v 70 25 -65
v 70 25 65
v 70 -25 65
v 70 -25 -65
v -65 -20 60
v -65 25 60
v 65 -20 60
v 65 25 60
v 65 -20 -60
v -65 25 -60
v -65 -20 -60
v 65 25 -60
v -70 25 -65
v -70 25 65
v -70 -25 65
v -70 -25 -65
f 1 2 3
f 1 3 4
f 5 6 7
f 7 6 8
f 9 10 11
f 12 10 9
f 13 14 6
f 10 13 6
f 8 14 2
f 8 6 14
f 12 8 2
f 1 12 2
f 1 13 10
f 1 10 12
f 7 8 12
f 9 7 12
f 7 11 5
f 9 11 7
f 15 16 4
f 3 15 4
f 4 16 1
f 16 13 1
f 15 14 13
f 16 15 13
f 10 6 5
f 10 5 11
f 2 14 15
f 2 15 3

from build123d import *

# Parameters (mm, degrees)
SKETCH_1_W          = 140
SKETCH_1_H          = 130
EXTRUDE_2_DEPTH     = 25
SKETCH_4_W          = 130
SKETCH_4_H          = 120
CUT_EXTRUDE_1_DEPTH = 45


with BuildPart() as part:
    # 草圖1 → 填料-伸長2 (new, symmetric)
    with BuildSketch(Plane(origin=(0, 0, 0), x_dir=(1, 0, 0), z_dir=(0, 1, 0))):
        Rectangle(SKETCH_1_W, SKETCH_1_H)
    extrude(amount=EXTRUDE_2_DEPTH, both=True)

    # 草圖4 → 除料-伸長1 (cut)
    with BuildSketch(Plane(origin=(0, 25, 0), x_dir=(1, 0, 0), z_dir=(0, 1, 0))):
        Rectangle(SKETCH_4_W, SKETCH_4_H)
    extrude(amount=-CUT_EXTRUDE_1_DEPTH, mode=Mode.SUBTRACT)


solid = part.part
